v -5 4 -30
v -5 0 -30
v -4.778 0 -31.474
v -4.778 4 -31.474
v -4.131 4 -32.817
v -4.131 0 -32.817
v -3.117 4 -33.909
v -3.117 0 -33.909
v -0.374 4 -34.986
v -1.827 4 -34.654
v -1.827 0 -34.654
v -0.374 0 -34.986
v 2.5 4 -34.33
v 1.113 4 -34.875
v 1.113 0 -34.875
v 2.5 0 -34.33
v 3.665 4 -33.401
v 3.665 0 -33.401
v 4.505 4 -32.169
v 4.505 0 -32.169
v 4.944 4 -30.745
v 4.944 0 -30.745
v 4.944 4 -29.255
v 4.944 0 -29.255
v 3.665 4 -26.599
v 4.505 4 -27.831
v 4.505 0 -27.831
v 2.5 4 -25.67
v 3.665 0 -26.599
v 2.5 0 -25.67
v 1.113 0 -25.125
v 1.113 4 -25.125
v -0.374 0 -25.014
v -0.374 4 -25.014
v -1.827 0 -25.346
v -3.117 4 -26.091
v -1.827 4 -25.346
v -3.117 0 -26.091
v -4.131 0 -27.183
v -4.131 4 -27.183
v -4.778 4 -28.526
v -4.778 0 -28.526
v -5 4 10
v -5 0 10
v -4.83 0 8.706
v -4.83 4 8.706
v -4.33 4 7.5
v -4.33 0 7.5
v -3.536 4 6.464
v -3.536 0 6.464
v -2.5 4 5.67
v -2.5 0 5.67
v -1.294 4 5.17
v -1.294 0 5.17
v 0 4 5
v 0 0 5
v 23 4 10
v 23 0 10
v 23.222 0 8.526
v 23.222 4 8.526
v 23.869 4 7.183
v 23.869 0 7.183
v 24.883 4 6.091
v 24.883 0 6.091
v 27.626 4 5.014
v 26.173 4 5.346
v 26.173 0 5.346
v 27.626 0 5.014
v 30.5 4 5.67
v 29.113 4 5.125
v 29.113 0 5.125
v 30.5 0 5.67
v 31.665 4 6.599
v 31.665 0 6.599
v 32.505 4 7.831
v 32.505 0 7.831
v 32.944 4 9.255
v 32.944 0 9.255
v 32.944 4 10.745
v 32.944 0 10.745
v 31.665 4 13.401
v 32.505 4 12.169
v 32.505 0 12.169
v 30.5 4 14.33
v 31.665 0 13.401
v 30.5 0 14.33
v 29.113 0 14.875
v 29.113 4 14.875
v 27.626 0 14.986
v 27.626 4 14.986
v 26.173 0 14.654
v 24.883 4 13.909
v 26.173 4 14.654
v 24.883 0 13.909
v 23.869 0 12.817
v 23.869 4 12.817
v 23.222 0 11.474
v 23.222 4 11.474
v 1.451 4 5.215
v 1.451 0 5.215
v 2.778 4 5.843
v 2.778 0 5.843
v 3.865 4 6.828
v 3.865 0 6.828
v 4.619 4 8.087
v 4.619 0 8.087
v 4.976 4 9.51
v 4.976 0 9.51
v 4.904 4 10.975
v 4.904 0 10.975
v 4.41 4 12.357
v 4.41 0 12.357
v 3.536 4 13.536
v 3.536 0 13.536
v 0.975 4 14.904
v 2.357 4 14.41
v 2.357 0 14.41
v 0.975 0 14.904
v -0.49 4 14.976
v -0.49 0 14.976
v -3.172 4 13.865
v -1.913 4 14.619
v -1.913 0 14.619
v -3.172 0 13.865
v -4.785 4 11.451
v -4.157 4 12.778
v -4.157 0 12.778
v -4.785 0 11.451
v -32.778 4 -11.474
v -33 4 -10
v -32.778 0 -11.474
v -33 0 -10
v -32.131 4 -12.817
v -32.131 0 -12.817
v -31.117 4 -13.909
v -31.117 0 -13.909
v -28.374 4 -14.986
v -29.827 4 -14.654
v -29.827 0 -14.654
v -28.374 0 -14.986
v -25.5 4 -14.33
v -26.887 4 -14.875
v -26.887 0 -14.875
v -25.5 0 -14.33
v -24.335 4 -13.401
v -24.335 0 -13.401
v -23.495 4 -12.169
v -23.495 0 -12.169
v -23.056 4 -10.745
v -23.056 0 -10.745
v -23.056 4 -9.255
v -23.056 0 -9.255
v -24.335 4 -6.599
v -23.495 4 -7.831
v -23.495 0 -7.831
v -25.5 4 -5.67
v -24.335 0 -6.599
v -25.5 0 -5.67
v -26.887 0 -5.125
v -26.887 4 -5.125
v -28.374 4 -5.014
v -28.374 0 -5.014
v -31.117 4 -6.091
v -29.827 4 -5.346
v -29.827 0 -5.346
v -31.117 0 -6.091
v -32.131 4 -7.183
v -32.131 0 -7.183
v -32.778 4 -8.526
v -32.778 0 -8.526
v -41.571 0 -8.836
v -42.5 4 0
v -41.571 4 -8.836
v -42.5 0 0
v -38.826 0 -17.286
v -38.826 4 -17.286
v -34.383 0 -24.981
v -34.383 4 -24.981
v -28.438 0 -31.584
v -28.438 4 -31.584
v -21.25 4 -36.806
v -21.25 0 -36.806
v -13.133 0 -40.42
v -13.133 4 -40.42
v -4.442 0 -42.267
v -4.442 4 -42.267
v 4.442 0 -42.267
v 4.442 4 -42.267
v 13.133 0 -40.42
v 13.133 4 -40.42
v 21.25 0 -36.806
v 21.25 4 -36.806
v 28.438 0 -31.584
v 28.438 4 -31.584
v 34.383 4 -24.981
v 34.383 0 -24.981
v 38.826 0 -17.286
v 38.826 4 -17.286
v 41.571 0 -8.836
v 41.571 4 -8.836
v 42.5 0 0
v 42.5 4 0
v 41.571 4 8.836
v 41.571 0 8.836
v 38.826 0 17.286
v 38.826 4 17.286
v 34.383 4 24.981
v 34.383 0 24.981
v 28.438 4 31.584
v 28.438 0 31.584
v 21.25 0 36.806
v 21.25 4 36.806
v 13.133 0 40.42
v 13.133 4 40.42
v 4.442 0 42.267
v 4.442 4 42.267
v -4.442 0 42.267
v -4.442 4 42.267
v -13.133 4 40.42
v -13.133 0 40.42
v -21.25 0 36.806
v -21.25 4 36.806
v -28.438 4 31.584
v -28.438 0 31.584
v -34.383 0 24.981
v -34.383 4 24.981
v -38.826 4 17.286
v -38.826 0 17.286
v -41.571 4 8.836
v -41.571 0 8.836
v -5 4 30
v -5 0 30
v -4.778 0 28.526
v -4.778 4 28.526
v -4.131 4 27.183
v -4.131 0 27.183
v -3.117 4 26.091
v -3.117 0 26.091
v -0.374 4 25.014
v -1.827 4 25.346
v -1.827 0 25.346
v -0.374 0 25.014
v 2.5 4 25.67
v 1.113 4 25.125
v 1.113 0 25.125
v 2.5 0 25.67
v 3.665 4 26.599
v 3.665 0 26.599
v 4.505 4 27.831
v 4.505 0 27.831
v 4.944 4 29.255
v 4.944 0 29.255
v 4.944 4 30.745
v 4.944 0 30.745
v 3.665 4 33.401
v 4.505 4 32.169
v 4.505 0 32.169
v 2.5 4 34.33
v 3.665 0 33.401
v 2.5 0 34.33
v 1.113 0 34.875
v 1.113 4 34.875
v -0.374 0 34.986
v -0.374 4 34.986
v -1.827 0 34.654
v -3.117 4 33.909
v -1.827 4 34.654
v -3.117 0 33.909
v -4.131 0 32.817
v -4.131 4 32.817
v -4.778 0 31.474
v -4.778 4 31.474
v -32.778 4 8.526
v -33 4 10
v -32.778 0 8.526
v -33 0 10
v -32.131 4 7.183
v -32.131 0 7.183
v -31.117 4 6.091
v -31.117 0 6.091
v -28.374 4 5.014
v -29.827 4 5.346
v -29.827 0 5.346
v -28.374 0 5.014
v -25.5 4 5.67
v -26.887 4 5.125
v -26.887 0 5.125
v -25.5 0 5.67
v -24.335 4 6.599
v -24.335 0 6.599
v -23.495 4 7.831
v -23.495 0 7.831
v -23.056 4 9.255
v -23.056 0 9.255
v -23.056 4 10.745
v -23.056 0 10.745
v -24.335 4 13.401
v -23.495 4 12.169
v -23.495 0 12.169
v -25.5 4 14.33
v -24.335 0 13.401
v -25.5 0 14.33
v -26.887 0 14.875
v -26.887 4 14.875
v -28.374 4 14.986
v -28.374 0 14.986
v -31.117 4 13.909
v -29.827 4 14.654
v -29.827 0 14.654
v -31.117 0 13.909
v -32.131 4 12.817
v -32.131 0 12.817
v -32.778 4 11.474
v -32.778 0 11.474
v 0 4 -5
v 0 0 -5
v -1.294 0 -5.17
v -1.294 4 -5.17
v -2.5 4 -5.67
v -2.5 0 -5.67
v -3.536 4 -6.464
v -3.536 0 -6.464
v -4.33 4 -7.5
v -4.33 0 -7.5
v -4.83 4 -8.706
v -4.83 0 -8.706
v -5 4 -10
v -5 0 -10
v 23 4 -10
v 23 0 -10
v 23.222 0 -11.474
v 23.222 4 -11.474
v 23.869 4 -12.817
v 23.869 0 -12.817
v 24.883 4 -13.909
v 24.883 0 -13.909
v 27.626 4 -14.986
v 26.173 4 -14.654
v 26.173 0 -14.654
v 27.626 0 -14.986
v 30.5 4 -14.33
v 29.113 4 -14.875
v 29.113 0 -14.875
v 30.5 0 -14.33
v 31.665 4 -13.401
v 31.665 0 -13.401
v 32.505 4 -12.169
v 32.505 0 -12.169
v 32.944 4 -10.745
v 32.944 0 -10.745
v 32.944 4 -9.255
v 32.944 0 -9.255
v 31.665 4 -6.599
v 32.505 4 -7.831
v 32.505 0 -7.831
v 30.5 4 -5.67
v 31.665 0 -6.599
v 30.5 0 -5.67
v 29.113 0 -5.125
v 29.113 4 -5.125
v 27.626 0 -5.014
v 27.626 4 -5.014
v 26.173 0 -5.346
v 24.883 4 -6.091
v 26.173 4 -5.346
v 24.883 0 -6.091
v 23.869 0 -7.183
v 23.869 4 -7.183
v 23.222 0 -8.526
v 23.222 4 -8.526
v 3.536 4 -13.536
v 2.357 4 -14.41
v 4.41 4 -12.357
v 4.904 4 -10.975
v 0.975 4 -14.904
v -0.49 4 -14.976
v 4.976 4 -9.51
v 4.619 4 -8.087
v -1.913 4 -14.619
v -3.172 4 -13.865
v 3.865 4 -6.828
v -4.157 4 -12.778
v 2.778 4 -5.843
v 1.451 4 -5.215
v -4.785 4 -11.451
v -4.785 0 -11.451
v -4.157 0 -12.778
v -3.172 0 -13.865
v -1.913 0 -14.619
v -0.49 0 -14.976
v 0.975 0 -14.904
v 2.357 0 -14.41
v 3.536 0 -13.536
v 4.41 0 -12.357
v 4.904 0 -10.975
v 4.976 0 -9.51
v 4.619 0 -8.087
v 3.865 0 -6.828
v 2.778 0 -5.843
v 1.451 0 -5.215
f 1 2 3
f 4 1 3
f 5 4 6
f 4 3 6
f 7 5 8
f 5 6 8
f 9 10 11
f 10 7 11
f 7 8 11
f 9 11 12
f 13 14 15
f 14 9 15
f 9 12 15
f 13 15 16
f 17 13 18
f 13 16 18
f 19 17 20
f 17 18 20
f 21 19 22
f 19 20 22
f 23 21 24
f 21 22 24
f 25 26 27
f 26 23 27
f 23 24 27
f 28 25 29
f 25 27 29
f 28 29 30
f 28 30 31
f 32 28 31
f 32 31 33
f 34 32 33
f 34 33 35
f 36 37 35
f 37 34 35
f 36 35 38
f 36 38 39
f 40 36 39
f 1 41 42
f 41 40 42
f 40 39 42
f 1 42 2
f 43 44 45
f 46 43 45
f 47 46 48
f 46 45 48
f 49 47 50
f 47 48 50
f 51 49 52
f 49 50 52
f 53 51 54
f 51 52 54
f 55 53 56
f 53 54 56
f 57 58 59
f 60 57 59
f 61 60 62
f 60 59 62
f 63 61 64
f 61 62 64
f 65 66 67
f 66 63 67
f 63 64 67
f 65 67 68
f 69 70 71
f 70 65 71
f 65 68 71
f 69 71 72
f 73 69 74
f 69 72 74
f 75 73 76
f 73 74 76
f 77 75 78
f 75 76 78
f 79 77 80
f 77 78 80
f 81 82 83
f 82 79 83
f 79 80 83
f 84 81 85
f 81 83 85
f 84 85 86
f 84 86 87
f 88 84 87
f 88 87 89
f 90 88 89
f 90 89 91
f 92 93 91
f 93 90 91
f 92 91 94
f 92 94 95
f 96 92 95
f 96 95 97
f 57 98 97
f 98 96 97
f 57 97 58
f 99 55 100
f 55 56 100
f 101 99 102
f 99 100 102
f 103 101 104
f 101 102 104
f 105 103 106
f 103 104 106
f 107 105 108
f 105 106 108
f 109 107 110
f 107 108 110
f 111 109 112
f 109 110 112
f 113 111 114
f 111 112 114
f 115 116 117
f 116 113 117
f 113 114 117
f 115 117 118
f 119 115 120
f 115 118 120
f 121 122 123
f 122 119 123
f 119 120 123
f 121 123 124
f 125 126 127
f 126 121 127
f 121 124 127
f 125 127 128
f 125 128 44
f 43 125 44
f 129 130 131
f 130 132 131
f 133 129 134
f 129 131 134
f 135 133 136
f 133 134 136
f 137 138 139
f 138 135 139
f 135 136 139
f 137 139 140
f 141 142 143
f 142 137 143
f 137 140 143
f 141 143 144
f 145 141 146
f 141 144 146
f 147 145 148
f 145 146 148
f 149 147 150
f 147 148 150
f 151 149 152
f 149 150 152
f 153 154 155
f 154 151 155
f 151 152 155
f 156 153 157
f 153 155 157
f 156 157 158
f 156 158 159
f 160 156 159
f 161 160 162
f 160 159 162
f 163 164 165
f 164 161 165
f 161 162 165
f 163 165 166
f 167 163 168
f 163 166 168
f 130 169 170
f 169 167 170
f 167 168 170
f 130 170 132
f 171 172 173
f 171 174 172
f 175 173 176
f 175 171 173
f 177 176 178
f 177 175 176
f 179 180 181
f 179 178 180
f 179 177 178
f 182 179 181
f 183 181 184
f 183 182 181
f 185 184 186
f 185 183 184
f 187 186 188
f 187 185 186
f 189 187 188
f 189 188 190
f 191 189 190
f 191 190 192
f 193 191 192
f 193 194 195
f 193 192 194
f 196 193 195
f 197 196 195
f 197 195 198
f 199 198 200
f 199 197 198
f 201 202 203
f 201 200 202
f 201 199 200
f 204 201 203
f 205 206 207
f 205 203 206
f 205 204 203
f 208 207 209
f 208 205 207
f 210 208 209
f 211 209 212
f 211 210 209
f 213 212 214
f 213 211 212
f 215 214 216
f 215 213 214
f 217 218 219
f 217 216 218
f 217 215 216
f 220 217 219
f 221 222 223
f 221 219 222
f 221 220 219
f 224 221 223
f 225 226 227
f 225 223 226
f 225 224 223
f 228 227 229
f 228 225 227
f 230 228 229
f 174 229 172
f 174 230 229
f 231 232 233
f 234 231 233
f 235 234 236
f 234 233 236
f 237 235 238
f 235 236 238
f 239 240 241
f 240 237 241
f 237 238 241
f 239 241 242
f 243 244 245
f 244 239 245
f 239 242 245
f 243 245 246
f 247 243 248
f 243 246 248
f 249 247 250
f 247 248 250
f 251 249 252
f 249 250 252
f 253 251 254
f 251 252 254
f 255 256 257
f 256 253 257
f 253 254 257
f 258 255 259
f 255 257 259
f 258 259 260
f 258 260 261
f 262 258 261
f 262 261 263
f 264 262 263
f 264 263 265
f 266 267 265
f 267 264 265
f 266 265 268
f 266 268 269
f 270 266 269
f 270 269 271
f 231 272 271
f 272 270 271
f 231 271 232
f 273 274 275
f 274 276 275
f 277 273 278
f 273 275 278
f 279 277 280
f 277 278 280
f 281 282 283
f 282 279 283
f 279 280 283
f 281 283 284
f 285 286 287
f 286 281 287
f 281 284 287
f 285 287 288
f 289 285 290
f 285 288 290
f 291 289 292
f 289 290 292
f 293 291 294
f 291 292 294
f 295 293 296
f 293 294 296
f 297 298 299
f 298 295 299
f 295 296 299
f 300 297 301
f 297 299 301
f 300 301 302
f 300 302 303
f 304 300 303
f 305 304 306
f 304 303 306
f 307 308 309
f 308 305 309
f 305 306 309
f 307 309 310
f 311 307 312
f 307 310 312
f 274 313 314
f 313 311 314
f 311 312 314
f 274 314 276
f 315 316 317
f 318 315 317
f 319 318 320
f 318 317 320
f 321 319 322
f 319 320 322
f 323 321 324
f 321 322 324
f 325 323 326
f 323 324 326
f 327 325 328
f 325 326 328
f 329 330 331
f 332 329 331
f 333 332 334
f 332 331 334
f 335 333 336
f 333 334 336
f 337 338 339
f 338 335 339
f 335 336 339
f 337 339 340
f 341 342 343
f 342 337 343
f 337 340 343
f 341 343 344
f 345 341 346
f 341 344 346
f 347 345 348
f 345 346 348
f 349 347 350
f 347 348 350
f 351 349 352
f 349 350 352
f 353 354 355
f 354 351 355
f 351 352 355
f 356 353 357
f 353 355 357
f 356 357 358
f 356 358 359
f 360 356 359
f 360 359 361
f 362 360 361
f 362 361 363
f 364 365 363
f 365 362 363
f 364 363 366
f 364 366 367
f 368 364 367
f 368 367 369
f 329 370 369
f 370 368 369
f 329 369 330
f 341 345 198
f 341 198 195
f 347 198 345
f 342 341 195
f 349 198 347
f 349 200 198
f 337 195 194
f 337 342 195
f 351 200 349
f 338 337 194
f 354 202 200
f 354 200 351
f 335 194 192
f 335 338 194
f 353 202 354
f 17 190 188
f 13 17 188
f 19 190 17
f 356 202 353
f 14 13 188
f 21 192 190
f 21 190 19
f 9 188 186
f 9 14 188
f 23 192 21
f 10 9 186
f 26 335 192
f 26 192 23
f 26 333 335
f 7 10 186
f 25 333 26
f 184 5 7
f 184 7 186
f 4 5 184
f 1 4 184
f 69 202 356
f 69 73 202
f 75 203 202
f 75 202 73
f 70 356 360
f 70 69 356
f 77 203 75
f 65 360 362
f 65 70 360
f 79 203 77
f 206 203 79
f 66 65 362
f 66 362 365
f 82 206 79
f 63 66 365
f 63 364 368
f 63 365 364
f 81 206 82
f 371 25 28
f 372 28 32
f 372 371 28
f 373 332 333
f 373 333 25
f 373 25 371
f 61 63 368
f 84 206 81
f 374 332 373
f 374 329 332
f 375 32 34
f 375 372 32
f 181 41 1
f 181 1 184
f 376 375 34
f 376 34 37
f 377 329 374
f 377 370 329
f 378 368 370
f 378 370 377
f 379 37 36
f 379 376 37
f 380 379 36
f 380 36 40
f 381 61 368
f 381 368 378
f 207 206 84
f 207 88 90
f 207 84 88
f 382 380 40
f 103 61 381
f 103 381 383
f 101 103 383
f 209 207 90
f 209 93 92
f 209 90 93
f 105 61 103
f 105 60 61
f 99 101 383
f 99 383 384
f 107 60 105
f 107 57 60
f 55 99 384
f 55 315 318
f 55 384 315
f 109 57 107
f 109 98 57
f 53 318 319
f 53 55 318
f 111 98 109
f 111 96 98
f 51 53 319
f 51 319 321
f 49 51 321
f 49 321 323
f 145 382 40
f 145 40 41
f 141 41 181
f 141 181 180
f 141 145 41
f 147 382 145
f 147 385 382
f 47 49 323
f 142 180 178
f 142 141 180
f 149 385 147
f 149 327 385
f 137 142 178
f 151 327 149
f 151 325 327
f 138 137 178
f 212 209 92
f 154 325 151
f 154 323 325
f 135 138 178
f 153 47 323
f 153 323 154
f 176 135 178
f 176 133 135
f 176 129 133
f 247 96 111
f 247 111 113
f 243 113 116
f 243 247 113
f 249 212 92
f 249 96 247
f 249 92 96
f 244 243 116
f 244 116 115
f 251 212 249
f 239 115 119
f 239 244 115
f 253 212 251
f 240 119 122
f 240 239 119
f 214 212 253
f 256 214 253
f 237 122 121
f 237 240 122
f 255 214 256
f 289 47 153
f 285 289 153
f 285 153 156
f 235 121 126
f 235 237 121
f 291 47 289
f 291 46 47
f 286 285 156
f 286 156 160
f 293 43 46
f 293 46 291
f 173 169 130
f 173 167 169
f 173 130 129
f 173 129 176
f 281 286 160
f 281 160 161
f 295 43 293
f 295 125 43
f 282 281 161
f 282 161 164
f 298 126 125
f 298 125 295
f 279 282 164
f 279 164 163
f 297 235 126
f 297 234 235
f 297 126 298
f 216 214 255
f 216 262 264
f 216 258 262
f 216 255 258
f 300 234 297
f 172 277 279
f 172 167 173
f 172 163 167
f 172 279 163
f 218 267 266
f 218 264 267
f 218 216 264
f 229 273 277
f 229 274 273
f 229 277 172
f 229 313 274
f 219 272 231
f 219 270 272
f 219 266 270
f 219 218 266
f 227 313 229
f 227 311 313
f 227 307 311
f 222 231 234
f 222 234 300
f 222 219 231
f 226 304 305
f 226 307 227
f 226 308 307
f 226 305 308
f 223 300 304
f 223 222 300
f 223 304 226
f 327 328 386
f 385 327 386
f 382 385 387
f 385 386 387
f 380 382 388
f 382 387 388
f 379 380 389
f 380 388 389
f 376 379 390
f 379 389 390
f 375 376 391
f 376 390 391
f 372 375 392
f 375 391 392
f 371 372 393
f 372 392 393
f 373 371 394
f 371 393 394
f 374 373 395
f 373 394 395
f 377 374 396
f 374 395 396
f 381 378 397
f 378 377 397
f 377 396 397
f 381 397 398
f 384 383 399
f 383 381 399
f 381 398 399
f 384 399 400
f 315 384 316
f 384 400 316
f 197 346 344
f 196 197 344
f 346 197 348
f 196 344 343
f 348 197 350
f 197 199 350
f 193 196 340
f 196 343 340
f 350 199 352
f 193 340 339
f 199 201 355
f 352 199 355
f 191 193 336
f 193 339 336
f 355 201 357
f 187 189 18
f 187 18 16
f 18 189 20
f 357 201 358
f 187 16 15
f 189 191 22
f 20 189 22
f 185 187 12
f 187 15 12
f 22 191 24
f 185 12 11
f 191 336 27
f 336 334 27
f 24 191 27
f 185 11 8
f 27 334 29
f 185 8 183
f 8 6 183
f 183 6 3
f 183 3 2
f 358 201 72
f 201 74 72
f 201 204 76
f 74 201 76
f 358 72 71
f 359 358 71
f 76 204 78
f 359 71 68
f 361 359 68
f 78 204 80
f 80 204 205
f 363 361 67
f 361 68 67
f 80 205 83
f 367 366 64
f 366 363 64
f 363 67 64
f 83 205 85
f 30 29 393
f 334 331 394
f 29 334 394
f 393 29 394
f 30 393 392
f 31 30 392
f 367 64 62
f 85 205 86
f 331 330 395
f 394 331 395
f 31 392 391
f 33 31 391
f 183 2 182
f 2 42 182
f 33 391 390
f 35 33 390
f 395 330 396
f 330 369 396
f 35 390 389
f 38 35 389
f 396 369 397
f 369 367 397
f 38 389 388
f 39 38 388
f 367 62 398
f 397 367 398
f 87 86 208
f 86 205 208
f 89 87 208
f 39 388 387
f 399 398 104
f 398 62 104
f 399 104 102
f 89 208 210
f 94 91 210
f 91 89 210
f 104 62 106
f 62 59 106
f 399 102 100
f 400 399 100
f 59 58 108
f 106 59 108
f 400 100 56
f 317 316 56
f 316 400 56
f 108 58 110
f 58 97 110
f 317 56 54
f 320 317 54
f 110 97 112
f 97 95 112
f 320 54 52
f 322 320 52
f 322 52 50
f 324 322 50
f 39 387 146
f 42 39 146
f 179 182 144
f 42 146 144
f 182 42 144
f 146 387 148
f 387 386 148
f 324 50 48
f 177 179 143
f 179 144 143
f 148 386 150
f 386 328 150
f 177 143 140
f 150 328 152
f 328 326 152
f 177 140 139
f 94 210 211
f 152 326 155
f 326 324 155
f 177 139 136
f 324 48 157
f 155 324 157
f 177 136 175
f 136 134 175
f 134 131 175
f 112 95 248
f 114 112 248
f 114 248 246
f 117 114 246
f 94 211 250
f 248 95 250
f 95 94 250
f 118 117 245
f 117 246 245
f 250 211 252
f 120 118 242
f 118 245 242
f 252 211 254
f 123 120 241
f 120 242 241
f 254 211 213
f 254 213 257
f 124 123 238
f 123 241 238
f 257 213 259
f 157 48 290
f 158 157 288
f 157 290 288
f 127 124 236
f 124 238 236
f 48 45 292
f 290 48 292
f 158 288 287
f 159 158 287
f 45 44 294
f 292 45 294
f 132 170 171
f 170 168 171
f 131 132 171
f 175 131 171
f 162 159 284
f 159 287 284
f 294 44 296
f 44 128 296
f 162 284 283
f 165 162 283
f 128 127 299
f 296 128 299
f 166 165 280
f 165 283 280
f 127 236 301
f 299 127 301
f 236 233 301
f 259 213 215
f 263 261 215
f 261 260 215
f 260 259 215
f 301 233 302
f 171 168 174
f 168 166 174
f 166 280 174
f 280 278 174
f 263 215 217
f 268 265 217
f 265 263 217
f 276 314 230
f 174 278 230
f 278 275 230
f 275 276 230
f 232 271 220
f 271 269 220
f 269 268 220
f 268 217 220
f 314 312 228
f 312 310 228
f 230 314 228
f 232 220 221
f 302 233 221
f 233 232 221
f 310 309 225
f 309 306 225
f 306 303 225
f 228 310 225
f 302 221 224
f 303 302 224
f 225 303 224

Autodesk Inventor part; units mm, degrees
ref_plane "YZ Plane" through (0, 0, 0) normal (1, 0, 0) x (0, 1, 0)
ref_plane "XZ Plane" through (0, 0, 0) normal (0, 1, 0) x (-1, 0, 0)
ref_plane "XY Plane" through (0, 0, 0) normal (0, 0, 1) x (1, 0, 0)
sketch "Sketch1" plane through (0, 0, 0) normal (0, 1, 0) x (-1, 0, 0)
  circle A0 centre (0, 0) radius 42.5
  line L0 (0, 0) -> (0, -5)
  line L1 (0, 0) -> (0, 5)
  circle A1 centre (28, 10) radius 5
  circle A2 centre (0, 10) radius 5
  circle A3 centre (-28, 10) radius 5
  circle A4 centre (28, -10) radius 5
  circle A5 centre (-28, -10) radius 5
  circle A6 centre (0, -10) radius 5
  circle A7 centre (0, 30) radius 5
  circle A8 centre (0, -30) radius 5
  dimension "d2" = 85
  dimension "d5" = 10
  dimension "d6" = 10
  dimension "d7" = 10
  dimension "d10" = 10
  dimension "d11" = 10
  dimension "d12" = 10
  dimension "d13" = 10
  dimension "d15" = 10
extrude "Extrusion1" add sketch "Sketch1" along normal blind 4
properties part number "Wires_Base"
